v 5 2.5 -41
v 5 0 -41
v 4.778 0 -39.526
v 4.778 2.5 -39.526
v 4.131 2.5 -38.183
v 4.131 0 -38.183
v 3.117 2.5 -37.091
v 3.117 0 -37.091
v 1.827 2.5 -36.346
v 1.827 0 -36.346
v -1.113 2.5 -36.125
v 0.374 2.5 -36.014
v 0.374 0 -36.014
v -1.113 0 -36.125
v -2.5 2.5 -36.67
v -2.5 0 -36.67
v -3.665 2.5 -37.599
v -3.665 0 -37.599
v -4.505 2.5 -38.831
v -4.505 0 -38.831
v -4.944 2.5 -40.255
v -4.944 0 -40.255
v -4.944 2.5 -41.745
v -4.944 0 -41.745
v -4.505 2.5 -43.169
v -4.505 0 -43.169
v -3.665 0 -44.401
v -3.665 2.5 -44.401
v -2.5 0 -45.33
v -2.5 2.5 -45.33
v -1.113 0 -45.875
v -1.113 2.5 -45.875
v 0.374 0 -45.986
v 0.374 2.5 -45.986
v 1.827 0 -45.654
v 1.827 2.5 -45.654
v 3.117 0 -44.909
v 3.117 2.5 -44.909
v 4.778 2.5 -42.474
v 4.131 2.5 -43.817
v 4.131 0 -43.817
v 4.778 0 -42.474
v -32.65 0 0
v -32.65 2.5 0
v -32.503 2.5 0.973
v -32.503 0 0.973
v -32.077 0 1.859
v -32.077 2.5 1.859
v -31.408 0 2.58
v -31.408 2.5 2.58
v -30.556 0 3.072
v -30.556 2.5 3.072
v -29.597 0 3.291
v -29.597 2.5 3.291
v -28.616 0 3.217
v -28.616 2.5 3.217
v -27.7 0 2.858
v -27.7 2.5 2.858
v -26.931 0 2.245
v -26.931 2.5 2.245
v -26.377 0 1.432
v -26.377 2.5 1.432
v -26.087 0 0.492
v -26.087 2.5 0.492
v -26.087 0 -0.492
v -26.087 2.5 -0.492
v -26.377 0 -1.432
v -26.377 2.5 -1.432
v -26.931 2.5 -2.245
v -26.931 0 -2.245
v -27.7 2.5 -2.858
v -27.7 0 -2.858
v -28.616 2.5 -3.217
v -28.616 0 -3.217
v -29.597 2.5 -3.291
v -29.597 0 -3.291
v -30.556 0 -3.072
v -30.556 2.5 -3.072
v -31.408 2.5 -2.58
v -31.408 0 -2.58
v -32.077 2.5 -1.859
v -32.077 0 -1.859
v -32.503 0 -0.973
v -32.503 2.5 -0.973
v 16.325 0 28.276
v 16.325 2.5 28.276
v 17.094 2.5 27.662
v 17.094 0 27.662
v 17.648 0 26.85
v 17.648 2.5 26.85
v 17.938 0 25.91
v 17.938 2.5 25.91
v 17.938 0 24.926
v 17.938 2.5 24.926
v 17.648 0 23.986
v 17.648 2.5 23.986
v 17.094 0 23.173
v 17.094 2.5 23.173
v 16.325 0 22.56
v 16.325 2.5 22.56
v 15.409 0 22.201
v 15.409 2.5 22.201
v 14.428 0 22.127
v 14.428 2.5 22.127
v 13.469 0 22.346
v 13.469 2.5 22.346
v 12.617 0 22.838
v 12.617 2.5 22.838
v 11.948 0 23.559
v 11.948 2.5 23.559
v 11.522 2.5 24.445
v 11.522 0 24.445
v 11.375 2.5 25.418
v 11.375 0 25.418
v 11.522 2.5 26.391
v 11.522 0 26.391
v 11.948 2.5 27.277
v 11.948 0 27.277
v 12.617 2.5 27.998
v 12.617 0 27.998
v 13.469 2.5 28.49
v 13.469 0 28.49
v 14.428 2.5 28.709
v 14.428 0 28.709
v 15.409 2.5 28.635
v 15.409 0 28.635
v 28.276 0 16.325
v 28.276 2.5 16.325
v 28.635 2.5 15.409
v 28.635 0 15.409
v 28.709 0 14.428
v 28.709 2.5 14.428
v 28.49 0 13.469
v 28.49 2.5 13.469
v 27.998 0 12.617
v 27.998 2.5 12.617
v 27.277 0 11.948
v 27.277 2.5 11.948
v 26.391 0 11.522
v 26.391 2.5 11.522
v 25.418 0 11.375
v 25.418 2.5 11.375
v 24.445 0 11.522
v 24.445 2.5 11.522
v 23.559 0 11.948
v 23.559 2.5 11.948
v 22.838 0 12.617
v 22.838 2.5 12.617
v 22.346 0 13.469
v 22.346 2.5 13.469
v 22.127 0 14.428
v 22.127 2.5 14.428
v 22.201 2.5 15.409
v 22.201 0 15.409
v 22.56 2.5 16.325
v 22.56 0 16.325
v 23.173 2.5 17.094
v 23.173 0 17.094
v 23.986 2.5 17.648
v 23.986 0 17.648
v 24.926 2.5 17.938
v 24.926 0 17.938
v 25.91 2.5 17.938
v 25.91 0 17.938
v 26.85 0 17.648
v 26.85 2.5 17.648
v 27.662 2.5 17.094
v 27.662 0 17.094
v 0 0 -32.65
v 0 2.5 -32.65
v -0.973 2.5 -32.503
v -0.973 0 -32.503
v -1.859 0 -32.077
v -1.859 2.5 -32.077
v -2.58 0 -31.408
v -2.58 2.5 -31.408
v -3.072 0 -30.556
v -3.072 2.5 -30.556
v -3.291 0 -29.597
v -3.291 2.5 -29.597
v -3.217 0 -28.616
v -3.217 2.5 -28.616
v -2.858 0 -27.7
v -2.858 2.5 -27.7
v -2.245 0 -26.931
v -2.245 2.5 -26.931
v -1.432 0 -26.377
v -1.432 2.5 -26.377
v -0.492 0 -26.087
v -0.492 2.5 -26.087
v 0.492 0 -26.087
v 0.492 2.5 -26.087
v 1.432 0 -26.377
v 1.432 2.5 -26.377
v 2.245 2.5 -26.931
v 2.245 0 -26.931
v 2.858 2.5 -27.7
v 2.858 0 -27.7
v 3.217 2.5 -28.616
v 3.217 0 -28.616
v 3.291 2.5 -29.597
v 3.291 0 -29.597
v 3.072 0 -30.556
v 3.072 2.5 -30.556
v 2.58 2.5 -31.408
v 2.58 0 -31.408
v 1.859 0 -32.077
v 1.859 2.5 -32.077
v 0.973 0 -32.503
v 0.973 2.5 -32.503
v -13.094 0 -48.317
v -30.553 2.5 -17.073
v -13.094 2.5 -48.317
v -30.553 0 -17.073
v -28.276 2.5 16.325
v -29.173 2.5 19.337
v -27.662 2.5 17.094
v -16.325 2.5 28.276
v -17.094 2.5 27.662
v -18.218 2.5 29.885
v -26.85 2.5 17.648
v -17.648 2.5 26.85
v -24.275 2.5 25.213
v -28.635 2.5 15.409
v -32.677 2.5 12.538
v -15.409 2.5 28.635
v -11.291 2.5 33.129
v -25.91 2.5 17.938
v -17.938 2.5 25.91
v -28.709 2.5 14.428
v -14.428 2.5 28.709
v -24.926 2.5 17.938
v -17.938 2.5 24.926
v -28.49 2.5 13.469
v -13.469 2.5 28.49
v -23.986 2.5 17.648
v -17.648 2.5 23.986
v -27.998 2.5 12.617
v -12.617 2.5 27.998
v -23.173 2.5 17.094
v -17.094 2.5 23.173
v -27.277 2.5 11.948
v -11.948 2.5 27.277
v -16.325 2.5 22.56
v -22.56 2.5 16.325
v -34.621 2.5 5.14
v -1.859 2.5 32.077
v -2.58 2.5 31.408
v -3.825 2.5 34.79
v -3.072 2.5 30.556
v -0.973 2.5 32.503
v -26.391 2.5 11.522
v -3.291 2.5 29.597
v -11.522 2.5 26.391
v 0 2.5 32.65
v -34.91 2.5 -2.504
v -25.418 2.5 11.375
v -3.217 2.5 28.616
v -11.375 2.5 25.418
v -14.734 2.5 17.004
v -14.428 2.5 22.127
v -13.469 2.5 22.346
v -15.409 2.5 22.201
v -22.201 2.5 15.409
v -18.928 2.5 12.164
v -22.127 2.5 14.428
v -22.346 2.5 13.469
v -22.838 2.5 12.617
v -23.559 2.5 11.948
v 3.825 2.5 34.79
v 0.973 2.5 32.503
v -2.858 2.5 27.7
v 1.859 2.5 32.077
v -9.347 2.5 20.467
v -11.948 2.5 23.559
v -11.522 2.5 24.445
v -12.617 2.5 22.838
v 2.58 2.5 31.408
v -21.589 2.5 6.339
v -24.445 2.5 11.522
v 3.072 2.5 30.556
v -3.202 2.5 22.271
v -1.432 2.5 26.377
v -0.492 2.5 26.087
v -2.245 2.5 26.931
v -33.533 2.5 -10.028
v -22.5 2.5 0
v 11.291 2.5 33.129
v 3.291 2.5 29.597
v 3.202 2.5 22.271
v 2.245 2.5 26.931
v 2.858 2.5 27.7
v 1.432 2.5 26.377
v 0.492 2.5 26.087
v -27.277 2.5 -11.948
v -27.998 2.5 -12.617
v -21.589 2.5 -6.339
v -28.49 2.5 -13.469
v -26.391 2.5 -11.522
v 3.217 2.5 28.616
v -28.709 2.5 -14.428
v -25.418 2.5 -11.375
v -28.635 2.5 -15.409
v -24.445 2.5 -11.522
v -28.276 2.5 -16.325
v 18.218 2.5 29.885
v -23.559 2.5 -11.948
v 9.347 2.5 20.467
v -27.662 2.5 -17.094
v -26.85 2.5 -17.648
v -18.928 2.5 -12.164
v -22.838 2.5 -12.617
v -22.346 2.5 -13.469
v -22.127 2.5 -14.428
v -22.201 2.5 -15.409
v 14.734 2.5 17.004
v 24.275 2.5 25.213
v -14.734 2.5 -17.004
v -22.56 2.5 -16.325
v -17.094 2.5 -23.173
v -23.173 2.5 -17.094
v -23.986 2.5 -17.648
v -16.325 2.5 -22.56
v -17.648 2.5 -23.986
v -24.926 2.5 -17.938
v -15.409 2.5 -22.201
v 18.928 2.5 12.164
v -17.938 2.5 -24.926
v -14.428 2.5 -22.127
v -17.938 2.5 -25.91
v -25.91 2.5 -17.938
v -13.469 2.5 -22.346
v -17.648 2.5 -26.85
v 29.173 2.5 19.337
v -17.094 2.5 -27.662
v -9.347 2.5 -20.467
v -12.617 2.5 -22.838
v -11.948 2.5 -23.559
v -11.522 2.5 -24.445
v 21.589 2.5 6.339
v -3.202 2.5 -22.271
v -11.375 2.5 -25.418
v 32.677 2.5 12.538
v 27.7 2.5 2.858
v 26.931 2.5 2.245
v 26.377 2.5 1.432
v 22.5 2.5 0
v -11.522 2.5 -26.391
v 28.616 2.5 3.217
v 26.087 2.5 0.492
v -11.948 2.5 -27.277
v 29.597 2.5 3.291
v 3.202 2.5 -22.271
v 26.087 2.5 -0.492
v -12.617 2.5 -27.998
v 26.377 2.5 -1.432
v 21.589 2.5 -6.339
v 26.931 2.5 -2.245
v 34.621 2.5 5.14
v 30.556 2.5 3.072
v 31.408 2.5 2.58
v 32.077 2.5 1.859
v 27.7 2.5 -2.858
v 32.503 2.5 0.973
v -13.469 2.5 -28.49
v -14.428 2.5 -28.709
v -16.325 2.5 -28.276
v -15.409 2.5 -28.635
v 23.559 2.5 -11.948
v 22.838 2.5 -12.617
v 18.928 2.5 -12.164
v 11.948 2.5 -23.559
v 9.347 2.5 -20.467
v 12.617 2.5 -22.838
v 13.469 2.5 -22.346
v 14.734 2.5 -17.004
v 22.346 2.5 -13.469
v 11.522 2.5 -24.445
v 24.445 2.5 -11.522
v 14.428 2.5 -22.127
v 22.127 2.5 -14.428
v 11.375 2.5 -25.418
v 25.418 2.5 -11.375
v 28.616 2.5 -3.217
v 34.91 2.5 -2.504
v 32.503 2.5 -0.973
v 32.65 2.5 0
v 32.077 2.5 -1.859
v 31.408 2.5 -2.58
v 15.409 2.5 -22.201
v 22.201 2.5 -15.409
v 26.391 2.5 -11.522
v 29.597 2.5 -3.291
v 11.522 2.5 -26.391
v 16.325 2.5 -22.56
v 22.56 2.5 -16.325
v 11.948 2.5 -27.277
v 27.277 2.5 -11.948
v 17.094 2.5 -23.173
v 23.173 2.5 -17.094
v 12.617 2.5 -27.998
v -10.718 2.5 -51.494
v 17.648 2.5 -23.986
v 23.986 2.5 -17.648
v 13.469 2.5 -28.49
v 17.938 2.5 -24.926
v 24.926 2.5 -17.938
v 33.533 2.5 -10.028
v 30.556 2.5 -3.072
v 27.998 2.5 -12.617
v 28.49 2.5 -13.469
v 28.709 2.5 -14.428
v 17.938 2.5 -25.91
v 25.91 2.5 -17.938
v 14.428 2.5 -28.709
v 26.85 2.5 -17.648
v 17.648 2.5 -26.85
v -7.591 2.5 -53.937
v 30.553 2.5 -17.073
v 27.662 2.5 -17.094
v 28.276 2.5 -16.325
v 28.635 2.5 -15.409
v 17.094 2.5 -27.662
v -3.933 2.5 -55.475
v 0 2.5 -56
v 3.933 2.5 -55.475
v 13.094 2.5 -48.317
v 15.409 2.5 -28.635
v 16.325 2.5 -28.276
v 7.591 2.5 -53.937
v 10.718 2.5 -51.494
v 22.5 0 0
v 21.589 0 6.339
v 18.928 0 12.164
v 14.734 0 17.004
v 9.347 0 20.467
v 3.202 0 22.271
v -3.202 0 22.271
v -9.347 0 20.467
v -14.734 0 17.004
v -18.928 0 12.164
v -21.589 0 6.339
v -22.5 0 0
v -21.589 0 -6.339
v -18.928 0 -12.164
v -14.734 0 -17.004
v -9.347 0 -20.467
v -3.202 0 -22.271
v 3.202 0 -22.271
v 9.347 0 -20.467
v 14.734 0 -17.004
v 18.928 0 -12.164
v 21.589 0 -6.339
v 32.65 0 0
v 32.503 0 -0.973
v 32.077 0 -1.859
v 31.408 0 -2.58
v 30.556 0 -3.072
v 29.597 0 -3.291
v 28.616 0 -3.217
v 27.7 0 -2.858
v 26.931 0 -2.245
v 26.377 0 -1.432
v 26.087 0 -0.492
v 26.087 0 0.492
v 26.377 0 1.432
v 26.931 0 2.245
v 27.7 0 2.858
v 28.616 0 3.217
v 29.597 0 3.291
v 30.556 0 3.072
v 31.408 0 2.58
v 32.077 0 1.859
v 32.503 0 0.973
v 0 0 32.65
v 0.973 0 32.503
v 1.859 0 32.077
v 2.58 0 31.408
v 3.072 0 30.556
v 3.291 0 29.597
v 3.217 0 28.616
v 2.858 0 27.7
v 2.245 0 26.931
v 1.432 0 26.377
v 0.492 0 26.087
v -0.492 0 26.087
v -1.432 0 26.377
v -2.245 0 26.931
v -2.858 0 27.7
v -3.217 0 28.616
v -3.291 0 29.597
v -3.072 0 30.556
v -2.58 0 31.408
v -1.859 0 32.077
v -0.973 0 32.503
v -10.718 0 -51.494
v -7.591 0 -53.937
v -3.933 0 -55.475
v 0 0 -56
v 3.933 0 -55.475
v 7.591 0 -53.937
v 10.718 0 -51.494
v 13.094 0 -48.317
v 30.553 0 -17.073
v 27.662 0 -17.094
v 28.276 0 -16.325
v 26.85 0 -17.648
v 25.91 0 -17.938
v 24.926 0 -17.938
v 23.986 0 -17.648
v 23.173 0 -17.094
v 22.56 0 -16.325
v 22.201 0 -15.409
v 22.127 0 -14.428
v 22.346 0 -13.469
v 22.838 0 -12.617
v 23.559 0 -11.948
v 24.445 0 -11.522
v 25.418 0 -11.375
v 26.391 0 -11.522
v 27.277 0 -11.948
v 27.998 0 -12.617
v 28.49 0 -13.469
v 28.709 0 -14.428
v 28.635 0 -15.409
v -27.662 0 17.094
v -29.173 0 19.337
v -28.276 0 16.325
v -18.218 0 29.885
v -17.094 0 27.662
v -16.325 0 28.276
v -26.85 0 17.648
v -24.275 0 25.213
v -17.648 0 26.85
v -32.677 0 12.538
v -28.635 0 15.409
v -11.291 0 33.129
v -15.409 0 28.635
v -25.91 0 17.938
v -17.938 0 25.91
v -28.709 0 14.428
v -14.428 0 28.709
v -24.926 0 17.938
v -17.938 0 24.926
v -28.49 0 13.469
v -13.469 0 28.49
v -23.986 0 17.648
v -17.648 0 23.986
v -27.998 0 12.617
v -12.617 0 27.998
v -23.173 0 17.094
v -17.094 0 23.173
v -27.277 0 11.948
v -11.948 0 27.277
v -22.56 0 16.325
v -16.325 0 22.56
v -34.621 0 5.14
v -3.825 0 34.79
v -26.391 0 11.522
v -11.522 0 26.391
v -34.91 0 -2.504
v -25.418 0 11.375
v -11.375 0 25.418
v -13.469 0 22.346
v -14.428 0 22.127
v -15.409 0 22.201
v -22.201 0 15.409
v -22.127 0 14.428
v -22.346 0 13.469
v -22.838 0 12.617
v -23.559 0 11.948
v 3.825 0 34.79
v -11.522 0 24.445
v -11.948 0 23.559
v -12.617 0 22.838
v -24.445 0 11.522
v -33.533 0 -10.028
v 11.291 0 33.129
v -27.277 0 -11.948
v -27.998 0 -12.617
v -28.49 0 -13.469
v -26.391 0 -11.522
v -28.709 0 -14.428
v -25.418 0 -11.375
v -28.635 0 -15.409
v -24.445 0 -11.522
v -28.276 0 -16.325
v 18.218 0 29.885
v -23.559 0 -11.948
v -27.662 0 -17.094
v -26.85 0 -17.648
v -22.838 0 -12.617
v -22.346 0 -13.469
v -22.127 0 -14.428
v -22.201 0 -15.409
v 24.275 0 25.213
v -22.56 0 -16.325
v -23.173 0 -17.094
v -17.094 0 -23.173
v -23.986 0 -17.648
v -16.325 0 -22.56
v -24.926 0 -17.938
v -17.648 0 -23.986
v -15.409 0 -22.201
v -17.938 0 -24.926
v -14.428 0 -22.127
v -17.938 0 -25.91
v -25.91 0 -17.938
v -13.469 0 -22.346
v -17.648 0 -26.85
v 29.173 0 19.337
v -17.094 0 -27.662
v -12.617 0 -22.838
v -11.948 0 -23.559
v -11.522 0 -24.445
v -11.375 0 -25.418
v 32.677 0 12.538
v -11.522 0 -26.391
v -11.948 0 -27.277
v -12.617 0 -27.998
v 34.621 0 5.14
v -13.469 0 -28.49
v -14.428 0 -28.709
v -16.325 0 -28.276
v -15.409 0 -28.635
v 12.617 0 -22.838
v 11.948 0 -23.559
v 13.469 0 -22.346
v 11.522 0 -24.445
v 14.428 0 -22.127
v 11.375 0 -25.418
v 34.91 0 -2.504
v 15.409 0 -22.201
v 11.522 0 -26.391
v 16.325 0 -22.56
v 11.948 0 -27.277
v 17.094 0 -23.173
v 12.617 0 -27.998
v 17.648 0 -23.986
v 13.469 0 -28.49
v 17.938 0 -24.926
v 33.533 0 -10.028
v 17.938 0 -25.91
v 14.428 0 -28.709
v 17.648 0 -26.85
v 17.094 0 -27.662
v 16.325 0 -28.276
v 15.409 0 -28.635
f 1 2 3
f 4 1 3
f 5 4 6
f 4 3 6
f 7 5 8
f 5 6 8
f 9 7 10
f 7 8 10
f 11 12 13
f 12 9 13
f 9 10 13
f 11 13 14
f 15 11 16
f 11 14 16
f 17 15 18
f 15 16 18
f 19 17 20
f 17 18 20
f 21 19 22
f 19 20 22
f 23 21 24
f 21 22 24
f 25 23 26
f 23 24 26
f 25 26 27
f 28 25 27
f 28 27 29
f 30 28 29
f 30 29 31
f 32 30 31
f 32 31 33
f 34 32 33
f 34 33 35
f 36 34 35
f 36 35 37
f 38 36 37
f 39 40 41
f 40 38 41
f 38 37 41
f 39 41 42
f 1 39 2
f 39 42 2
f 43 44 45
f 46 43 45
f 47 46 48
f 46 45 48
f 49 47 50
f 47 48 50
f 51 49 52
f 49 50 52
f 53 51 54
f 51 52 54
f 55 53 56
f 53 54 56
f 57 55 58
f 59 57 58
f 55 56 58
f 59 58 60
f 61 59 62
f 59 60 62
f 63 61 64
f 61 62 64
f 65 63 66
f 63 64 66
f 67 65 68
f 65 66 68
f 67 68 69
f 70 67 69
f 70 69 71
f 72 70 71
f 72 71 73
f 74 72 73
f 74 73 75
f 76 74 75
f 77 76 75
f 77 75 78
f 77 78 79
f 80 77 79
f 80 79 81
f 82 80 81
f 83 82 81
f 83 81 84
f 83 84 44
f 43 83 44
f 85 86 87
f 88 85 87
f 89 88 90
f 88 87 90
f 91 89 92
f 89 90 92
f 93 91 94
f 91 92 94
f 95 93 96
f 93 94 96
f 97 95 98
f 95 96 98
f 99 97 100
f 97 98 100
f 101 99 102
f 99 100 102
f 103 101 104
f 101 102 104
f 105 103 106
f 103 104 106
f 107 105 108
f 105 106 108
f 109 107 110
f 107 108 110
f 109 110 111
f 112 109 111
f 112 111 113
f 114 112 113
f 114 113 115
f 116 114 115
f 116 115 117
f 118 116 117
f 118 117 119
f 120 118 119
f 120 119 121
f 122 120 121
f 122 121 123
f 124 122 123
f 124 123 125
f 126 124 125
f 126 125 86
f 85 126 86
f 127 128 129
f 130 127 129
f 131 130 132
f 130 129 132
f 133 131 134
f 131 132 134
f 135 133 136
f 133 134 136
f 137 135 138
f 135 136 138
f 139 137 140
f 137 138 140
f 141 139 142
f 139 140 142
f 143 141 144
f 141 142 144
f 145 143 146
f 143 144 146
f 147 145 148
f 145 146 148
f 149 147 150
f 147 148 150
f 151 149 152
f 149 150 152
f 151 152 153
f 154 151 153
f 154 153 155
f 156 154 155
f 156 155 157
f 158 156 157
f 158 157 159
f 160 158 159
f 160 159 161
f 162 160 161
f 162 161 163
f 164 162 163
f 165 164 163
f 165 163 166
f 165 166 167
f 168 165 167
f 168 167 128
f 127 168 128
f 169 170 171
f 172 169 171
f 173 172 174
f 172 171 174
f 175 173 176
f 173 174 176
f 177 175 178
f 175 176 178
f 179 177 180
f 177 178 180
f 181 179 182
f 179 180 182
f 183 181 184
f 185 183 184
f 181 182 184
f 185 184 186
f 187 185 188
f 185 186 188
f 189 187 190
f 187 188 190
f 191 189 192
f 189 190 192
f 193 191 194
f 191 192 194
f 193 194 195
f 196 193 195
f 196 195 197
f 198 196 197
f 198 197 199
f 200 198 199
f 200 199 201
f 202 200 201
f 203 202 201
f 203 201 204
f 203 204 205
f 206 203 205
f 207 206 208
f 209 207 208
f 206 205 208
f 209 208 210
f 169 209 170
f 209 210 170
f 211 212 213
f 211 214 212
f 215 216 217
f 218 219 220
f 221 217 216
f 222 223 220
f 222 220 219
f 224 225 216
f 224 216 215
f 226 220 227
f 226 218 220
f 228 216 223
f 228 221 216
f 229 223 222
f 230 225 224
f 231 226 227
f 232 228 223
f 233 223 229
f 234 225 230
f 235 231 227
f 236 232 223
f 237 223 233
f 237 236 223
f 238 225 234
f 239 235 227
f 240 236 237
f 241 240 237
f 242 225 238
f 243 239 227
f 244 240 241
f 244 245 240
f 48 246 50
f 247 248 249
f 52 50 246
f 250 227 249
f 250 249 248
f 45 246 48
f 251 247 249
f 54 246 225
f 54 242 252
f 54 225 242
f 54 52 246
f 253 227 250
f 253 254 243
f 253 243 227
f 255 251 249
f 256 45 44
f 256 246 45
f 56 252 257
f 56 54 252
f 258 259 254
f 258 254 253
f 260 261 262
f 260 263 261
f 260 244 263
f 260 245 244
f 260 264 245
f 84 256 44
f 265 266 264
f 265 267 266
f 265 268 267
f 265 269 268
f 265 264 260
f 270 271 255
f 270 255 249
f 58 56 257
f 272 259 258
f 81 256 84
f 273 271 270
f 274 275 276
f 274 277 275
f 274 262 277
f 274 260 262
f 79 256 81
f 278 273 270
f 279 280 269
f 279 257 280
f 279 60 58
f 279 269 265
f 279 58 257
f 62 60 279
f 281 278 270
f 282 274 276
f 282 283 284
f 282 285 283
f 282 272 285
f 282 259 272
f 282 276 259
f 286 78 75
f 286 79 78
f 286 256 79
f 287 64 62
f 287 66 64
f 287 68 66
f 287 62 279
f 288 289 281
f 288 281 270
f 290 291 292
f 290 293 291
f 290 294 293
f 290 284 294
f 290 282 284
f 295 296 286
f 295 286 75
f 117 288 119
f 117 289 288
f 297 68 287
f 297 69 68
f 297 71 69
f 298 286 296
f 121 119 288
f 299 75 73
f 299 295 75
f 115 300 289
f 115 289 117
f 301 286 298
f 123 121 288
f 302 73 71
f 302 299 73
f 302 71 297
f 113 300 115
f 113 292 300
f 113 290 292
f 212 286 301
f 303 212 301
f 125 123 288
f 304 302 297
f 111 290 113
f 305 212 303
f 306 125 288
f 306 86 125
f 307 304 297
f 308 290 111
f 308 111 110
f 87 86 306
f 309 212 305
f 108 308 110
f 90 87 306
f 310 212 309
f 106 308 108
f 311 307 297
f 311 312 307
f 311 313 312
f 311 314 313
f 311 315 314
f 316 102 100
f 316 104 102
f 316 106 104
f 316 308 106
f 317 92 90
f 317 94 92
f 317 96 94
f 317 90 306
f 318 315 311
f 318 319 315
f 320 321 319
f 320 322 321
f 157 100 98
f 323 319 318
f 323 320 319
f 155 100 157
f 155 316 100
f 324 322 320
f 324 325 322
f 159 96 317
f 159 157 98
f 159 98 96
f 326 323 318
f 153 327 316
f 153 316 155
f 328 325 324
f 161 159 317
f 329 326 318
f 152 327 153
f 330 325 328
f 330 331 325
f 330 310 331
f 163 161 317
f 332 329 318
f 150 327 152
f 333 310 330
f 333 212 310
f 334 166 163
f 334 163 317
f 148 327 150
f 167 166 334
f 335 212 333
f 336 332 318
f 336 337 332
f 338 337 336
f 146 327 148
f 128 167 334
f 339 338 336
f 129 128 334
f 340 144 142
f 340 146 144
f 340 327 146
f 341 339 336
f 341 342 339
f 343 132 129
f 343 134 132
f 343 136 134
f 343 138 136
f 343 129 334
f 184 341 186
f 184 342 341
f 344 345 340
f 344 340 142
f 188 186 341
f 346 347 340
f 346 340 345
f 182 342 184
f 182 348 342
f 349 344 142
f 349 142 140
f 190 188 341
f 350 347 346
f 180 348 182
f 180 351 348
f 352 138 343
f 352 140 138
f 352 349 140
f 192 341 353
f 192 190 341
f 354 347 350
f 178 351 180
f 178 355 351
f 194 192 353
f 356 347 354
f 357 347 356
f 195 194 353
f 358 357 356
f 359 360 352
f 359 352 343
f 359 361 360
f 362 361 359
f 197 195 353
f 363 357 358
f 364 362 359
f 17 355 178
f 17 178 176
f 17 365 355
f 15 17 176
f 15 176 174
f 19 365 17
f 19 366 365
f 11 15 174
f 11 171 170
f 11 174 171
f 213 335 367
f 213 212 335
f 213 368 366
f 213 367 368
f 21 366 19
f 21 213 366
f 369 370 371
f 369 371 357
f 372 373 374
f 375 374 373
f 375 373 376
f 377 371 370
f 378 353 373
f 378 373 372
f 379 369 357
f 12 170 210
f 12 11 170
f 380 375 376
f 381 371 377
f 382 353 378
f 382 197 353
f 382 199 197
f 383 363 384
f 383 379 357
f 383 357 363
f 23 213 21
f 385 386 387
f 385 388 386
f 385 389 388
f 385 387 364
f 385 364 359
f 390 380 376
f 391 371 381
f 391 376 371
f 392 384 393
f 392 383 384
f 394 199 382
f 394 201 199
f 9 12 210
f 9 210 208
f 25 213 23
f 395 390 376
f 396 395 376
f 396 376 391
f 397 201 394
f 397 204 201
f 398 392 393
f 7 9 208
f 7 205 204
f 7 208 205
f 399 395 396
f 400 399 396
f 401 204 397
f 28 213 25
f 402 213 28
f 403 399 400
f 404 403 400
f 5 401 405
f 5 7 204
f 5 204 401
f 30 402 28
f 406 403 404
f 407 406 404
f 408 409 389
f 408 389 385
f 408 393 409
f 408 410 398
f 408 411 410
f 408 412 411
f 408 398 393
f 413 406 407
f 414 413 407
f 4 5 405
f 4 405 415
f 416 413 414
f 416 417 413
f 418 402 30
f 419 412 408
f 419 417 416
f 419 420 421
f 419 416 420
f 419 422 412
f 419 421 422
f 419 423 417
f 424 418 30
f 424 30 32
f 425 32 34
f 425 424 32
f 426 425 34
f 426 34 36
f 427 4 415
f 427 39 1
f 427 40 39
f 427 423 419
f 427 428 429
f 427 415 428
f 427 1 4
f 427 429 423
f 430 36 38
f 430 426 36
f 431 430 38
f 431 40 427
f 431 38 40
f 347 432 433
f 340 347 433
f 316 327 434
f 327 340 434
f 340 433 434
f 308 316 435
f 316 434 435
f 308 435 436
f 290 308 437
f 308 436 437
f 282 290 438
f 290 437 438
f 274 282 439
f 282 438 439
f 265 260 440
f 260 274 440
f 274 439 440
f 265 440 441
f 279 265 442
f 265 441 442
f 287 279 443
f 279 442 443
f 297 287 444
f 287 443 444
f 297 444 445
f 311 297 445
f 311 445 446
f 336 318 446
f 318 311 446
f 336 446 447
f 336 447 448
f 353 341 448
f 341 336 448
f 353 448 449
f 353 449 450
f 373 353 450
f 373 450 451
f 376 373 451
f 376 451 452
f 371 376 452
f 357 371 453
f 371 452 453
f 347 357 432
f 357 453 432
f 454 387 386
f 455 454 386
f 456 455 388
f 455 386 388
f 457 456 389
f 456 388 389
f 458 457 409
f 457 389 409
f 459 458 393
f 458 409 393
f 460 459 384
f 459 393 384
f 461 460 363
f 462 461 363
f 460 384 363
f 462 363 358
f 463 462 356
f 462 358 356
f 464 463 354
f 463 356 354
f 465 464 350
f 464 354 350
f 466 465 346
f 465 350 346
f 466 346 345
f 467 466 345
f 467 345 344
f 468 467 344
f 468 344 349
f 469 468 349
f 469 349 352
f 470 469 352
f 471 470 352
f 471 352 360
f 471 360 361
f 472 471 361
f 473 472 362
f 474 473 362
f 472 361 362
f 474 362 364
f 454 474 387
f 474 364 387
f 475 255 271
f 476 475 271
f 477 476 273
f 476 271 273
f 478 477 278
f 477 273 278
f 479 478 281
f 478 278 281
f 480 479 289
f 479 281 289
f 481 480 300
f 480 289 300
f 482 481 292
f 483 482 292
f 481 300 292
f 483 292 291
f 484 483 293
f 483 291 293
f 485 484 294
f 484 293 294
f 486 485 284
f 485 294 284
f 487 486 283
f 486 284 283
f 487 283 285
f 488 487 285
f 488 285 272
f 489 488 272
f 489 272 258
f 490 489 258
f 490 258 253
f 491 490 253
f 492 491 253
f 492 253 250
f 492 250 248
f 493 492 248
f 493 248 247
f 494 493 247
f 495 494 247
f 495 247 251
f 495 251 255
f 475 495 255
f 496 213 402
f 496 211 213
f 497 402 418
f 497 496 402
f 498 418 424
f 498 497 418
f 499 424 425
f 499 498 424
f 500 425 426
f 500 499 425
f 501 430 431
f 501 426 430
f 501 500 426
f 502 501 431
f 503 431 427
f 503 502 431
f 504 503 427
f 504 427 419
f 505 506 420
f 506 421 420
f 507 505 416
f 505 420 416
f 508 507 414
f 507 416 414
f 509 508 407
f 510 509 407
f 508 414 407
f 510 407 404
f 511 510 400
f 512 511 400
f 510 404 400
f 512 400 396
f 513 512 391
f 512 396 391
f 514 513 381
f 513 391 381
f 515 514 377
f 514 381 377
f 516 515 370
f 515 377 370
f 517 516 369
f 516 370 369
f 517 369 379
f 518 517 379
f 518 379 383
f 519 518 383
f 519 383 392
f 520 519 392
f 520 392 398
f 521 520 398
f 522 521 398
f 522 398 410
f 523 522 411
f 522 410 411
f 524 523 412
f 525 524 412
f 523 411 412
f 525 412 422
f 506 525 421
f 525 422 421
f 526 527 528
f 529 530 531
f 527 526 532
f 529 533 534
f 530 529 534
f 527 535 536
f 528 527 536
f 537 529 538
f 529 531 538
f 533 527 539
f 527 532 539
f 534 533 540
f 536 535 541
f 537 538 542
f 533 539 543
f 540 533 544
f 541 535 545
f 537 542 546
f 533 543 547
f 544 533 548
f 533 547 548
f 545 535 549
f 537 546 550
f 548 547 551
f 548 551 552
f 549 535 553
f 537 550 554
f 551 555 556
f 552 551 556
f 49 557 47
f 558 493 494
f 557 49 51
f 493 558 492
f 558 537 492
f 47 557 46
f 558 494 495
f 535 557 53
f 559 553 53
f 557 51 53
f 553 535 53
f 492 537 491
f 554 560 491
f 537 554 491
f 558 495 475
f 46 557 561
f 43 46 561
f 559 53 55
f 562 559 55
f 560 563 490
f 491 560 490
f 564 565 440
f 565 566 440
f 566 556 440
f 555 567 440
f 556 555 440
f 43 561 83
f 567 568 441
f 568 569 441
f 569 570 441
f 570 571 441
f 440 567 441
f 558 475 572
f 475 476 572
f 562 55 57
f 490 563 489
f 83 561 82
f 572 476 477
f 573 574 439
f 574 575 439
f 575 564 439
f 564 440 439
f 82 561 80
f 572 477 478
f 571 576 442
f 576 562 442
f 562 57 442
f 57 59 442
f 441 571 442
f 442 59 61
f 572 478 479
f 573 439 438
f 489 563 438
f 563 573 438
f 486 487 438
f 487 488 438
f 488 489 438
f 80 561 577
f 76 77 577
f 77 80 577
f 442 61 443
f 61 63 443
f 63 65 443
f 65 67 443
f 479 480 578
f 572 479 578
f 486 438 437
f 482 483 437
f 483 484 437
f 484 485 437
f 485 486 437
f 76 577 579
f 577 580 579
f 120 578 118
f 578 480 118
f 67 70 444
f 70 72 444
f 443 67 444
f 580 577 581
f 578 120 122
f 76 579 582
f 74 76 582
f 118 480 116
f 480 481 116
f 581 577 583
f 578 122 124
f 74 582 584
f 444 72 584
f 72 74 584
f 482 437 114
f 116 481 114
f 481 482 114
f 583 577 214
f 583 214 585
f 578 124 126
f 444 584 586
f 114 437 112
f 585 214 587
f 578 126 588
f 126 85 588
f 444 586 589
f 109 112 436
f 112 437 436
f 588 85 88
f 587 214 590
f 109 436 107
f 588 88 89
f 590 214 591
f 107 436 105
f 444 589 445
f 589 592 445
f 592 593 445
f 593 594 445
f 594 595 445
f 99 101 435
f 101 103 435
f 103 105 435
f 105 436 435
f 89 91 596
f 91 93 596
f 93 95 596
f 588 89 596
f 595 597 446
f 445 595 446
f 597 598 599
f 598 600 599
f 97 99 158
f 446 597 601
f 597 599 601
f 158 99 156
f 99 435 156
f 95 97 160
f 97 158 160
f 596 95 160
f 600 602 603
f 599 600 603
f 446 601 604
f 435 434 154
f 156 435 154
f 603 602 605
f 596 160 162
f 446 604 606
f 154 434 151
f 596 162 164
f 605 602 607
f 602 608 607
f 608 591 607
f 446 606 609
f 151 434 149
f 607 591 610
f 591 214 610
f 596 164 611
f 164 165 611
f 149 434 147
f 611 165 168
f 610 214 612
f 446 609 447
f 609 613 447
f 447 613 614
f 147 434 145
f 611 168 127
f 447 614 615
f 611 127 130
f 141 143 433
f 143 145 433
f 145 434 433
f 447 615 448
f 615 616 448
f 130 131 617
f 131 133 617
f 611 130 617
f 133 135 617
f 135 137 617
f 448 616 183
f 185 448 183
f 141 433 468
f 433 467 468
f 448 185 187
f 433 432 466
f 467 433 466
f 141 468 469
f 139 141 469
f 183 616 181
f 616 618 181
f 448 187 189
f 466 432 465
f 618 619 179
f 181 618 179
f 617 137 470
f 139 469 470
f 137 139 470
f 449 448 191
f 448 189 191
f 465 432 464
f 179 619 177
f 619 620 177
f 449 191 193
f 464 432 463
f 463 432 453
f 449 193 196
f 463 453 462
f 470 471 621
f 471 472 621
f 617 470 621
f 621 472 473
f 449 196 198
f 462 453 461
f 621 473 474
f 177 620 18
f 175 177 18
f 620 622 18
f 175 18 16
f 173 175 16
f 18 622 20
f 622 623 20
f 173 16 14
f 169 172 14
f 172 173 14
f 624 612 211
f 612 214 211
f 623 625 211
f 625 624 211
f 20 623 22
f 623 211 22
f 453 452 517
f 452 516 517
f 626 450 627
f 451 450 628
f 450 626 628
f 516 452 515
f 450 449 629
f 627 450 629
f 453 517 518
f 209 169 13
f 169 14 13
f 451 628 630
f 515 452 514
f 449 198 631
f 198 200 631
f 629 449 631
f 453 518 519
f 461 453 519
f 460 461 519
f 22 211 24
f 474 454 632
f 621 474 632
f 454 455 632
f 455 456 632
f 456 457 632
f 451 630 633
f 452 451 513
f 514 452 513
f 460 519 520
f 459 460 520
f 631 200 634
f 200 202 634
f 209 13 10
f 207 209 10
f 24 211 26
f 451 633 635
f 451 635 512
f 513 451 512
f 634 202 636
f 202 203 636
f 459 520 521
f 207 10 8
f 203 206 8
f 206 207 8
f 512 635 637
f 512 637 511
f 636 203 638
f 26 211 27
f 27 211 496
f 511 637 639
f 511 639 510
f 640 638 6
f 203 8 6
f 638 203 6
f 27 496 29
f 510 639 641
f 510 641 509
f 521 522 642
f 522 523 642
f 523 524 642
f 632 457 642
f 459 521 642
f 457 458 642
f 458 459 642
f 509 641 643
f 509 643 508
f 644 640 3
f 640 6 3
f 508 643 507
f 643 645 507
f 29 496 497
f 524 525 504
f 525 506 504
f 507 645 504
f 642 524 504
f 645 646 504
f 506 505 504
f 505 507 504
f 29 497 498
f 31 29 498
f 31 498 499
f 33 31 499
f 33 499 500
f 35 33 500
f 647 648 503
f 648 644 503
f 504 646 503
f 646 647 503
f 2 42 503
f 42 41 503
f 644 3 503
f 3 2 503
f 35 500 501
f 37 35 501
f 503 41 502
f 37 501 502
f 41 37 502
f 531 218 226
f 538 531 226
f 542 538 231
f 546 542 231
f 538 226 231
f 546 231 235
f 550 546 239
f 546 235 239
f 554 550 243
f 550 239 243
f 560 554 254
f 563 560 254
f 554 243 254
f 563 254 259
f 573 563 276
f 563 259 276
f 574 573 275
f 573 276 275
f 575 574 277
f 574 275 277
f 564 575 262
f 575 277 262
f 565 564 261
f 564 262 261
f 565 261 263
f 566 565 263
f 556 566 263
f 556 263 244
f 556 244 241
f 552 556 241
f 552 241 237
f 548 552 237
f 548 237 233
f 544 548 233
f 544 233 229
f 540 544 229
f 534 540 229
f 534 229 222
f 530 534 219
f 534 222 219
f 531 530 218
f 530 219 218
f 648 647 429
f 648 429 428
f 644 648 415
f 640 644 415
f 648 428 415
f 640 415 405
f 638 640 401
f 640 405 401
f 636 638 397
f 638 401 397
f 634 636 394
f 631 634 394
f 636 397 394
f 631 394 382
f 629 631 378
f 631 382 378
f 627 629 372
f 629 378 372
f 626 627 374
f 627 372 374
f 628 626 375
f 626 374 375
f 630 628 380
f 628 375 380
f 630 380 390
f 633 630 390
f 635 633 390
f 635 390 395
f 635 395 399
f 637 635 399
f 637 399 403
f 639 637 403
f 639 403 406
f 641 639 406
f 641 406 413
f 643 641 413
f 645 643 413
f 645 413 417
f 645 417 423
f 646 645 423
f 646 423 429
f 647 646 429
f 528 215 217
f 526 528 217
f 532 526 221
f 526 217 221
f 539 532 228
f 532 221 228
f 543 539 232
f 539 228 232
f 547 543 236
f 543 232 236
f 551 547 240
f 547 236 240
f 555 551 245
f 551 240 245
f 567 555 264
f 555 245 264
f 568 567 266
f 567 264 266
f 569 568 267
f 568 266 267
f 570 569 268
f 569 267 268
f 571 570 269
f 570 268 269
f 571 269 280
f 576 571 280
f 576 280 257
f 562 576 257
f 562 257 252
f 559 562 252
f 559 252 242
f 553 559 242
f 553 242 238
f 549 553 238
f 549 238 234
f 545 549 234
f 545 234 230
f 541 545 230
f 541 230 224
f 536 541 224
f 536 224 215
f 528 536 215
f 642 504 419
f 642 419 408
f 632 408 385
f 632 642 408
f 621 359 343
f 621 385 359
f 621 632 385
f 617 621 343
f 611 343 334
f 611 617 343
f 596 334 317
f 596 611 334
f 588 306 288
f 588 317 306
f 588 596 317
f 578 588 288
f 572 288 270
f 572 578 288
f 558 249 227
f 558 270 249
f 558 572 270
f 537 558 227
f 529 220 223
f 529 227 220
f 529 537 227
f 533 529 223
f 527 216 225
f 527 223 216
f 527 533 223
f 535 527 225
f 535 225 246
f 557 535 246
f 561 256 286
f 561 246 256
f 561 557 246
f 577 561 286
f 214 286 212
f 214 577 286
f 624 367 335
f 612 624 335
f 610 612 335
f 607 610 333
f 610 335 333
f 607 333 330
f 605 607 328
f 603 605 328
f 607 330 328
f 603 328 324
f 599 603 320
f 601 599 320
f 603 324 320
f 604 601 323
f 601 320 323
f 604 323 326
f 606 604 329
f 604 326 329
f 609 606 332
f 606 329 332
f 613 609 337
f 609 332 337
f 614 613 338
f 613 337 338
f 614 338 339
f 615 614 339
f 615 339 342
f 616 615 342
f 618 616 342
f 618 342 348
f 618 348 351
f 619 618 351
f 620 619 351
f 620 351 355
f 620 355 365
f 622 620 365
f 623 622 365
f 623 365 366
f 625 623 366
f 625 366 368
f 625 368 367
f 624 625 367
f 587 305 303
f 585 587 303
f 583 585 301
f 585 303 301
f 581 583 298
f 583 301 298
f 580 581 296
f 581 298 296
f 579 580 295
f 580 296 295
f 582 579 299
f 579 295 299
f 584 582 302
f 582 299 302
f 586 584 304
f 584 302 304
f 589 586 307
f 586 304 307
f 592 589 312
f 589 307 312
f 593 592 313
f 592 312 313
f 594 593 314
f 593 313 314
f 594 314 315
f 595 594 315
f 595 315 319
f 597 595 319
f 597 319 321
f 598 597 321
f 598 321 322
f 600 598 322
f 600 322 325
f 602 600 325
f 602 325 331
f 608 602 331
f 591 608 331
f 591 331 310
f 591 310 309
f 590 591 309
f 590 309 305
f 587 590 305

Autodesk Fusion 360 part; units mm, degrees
sketch "Sketch1" plane through (0, 0, 0) normal (0, 1, 0) x (1, 0, 0)
  circle A0 centre (0, 0) radius 22.5
  line L0 (-30.5533, 17.0732) -> (-13.0943, 48.3171)
  arc A1 (13.0943, 48.3171) -> (-13.0943, 48.3171) centre (0, 41) ccw
  line L1 (13.0943, 48.3171) -> (30.5533, 17.0732)
  arc A2 (-30.5533, 17.0732) -> (30.5533, 17.0732) centre (0, 0) ccw
  circle A3 centre (0, 41) radius 5
  point P0 (0, 29.35)
  dimension "d1" = 45
  dimension "d2" = 41
  dimension "d3" = 10
  dimension "d4" = 35
  dimension "d5" = 15
  dimension "d8" = 29.35
extrude "Extrude1" add sketch "Sketch1" along normal blind 2.5
hole "Hole1" at (0, 0, -29.35) direction (0, 1, 0) diameter 6.6 end through all
pattern_circular "C-Pattern1" count 12 over 360 about axis through (0, 1.75, 0) along (0, 1, 0) of "Hole1"
equation "d8 = ( 58.7 / 2 ) * 1 mm"
